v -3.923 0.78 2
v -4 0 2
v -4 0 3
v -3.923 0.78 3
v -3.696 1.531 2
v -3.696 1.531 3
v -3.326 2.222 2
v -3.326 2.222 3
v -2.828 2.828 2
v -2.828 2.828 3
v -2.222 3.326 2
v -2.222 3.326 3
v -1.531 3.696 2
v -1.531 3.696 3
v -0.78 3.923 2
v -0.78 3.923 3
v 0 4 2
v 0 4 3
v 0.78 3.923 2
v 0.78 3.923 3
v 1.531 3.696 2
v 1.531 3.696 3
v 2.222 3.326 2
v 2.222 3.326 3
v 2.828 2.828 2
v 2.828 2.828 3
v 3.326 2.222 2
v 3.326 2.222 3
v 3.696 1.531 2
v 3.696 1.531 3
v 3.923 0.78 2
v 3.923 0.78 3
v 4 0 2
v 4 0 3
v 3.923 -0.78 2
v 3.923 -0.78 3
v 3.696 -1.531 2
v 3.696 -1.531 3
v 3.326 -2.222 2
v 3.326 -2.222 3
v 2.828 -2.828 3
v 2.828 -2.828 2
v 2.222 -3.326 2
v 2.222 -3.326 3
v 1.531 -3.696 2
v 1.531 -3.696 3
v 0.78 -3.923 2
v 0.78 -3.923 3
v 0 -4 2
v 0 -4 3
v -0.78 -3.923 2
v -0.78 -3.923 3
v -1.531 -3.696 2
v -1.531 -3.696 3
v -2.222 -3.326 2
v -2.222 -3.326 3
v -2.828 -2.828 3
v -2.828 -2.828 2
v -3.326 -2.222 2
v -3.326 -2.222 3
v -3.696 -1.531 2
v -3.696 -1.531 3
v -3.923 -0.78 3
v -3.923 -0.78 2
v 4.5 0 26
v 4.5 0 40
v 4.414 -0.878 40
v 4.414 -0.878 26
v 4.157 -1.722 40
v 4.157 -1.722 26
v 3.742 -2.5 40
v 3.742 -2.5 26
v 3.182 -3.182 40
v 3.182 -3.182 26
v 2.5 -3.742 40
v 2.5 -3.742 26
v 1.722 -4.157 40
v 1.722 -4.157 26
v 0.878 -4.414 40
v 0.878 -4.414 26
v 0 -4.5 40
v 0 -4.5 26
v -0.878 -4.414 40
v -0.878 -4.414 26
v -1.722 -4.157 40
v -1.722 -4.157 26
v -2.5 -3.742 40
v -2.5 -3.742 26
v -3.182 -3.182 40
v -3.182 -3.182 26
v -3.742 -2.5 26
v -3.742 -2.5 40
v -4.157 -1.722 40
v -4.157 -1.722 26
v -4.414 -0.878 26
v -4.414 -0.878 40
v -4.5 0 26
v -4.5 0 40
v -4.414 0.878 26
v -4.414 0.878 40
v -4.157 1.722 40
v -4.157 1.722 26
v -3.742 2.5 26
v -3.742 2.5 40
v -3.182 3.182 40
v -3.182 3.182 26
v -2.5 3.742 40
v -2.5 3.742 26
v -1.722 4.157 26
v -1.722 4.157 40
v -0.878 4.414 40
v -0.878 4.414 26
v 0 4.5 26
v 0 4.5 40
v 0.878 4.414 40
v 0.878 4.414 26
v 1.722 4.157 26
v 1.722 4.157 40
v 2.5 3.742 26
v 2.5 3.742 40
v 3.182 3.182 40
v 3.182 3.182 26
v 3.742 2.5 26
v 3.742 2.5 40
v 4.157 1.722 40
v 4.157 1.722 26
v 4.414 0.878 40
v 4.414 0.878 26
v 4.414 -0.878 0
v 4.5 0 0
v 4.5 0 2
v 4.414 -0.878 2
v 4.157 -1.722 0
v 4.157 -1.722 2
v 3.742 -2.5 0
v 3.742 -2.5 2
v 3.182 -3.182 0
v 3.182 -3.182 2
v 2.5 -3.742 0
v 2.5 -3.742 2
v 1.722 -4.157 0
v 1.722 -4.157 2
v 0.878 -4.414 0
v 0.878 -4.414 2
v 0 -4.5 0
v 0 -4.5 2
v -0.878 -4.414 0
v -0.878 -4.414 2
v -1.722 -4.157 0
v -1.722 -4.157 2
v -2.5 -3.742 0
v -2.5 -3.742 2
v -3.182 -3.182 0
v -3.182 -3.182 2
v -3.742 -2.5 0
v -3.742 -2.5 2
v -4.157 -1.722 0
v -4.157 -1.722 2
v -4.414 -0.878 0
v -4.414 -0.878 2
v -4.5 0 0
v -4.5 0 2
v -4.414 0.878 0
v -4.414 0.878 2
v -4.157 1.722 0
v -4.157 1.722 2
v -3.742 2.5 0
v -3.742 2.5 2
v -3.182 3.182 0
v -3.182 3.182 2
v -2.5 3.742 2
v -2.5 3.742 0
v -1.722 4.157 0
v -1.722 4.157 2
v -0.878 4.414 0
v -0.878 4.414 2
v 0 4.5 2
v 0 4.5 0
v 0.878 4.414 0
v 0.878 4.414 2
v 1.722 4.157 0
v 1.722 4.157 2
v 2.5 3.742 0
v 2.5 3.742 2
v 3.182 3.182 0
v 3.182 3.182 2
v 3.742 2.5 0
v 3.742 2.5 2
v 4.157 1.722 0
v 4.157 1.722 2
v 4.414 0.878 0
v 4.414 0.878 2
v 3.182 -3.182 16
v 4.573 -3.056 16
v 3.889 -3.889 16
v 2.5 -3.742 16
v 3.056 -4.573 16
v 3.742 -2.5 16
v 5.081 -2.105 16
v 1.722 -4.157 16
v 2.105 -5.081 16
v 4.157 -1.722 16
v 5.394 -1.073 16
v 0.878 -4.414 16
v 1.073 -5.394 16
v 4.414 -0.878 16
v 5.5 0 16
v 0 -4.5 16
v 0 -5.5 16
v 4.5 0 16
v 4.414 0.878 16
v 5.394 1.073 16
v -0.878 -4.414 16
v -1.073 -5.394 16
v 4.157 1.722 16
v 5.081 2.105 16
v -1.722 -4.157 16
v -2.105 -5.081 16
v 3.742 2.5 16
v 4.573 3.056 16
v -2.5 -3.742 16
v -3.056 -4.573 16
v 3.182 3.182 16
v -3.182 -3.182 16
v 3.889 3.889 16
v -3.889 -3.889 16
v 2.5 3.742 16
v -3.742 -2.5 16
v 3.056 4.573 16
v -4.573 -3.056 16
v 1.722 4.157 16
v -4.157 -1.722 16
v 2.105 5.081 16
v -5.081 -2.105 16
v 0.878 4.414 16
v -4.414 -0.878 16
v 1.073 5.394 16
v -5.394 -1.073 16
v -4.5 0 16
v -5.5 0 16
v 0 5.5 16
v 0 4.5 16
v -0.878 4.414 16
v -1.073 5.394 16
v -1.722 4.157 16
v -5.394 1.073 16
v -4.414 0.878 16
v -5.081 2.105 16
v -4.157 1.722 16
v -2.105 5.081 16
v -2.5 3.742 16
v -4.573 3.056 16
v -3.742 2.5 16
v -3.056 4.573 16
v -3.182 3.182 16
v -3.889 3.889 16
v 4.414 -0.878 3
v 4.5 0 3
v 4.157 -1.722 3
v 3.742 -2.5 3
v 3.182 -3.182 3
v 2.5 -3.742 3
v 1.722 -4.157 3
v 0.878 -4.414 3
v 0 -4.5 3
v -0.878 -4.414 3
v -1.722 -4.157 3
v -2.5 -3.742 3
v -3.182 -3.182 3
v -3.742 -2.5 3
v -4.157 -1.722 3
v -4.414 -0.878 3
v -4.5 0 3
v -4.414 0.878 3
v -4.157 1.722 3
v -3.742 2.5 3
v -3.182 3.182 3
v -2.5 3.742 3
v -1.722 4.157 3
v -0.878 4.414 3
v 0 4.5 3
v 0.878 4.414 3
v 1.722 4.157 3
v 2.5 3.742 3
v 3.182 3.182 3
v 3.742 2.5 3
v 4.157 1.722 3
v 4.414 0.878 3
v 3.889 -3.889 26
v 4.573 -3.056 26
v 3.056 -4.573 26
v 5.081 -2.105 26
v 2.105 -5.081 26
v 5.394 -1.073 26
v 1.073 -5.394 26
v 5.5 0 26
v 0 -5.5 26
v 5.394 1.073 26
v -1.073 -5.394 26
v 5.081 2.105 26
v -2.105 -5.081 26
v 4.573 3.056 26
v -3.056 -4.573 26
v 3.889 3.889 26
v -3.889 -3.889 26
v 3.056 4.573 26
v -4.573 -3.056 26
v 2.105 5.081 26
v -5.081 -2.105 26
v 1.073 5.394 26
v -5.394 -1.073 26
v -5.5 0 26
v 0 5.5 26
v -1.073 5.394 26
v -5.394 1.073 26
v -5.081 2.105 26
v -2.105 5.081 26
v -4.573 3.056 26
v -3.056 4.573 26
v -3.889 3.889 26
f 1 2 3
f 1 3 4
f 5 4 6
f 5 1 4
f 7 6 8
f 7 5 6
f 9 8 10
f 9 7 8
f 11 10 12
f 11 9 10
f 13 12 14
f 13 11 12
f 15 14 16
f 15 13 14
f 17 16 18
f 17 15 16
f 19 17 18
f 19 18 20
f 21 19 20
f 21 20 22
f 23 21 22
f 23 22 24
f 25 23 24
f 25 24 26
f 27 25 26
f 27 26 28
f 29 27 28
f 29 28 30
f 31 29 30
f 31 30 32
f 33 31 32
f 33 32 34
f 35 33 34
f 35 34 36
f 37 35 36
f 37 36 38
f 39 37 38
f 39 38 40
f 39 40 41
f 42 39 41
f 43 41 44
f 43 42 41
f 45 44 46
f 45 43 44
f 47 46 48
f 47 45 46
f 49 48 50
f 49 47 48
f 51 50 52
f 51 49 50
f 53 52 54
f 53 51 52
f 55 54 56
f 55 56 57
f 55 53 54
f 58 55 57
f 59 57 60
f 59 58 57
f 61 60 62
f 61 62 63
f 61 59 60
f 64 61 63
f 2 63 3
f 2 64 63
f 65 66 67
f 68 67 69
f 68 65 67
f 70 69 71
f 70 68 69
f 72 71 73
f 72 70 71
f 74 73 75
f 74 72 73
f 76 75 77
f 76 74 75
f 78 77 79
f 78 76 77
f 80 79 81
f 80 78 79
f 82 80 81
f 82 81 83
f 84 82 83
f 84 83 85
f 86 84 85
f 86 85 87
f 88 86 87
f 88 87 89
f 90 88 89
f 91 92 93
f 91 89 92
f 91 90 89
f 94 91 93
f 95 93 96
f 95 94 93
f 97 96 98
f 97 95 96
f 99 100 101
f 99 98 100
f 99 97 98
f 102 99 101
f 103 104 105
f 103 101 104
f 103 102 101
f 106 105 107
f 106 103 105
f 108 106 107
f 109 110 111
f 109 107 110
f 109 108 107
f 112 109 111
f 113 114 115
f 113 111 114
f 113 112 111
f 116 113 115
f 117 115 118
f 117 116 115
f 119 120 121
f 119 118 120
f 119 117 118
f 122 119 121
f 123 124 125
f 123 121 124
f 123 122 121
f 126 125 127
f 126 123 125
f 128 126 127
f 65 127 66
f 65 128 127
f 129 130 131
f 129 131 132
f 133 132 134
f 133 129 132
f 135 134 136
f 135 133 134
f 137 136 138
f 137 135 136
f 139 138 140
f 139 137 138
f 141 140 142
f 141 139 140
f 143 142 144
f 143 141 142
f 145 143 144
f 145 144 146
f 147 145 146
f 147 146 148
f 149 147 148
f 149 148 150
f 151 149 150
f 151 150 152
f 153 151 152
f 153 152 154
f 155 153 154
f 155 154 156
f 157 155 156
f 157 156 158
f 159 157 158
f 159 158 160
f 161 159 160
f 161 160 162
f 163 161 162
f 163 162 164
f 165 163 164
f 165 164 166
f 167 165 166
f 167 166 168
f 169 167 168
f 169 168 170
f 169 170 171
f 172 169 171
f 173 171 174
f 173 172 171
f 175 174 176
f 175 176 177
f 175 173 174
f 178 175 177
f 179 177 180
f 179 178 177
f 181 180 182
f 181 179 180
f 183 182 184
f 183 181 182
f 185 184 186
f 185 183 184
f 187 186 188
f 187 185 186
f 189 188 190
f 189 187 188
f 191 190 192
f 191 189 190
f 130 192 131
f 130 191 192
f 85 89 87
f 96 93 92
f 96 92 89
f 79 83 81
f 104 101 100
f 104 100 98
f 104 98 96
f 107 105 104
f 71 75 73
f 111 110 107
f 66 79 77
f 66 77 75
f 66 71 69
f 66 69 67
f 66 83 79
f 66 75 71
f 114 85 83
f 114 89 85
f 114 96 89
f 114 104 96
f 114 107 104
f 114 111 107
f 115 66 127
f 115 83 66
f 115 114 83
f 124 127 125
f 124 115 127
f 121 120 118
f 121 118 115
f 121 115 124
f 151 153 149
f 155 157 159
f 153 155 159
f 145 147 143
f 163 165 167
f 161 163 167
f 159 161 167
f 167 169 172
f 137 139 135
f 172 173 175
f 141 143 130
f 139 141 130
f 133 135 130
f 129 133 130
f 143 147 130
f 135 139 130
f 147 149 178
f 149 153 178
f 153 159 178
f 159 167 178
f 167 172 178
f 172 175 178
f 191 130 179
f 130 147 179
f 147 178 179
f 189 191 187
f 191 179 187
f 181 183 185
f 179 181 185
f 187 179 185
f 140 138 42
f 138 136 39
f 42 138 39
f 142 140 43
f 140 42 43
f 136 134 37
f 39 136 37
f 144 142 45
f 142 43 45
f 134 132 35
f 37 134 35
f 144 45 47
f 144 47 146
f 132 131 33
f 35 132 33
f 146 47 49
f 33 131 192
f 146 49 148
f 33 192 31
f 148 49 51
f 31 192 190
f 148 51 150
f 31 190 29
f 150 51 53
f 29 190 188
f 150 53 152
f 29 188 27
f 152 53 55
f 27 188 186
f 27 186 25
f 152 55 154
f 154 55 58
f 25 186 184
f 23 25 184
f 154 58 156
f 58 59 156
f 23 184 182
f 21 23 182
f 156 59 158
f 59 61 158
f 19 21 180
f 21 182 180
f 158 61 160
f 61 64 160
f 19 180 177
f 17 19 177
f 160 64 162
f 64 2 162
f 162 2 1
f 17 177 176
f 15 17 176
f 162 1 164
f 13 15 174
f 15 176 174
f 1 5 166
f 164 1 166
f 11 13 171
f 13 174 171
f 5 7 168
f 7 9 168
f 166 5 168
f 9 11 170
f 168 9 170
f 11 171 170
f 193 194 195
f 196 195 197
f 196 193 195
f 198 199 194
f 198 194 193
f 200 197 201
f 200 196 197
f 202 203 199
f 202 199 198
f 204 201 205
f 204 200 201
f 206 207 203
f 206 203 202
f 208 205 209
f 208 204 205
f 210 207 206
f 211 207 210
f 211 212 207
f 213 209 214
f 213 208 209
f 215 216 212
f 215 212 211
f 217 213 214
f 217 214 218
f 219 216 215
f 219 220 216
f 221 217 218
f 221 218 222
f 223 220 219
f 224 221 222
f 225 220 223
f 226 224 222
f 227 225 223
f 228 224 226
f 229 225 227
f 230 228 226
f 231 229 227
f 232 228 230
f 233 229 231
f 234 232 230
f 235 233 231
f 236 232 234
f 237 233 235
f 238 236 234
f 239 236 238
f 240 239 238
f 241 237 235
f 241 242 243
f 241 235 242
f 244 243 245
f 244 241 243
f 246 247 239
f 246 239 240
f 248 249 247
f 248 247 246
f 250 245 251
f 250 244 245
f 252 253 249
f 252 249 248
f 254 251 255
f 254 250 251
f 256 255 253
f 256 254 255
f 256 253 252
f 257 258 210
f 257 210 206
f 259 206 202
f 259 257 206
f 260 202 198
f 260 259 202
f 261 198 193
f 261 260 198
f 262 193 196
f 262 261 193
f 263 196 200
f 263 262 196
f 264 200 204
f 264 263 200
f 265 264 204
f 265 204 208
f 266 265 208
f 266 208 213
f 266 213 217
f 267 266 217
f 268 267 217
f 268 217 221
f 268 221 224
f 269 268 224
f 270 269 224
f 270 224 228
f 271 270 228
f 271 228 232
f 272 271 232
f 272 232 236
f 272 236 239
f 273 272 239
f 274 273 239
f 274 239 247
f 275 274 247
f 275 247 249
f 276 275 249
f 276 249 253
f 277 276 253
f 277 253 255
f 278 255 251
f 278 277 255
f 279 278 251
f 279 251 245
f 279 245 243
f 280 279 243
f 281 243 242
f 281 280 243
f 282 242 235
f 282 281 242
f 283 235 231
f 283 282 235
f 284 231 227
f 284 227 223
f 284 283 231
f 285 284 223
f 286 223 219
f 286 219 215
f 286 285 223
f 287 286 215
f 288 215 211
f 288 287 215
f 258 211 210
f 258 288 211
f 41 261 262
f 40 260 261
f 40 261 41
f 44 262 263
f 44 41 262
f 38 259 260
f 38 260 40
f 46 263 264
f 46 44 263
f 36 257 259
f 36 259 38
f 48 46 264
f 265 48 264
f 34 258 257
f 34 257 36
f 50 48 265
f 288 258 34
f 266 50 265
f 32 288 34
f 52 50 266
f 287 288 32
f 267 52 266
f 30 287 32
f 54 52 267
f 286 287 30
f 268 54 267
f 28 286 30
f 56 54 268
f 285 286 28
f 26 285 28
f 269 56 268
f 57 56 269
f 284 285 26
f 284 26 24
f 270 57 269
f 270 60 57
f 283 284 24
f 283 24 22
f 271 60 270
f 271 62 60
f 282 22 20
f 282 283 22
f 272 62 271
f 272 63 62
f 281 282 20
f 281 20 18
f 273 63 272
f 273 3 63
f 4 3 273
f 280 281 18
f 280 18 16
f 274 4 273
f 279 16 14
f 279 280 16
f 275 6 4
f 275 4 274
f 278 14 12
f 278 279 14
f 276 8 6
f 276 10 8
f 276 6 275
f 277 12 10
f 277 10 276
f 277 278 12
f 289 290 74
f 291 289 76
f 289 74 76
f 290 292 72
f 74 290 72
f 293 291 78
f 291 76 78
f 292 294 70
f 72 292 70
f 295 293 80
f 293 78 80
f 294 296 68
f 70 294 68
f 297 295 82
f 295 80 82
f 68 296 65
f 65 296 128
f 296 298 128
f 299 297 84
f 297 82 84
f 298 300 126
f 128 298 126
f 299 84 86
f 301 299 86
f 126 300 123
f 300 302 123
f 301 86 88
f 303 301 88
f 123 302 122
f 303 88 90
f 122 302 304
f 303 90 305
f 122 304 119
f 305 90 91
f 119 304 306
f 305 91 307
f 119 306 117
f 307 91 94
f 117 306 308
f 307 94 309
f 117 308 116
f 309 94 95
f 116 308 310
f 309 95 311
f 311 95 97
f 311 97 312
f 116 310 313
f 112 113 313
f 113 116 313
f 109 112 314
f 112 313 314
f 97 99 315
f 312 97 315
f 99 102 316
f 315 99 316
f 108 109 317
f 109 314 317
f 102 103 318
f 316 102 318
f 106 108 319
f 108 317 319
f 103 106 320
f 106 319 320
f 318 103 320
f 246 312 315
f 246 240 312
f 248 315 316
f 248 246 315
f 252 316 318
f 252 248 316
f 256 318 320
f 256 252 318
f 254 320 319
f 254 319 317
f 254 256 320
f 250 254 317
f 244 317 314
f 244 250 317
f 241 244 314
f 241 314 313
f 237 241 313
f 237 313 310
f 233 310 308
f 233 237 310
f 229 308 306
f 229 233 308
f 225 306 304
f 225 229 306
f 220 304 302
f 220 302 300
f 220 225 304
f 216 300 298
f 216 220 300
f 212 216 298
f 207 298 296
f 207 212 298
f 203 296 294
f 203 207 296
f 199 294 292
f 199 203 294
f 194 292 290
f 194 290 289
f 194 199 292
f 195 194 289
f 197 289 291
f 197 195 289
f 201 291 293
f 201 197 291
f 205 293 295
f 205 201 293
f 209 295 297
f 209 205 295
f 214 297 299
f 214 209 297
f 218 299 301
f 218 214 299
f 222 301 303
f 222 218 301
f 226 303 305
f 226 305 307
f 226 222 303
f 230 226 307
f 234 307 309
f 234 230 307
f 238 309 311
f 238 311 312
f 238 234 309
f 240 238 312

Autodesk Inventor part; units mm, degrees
ref_plane "YZ Plane" through (0, 0, 0) normal (1, 0, 0) x (0, 1, 0)
sketch "草圖2" plane through (0, 0, 0) normal (0, 0, 1) x (1, 0, 0)
  circle A0 centre (0, 0) radius 4.5
  dimension "d3" = 9
extrude "擠出2" add sketch "草圖2" along normal blind 40
ref_plane "工作平面3" through (0, 0, 16) normal (0, 0, -1) x (-1, 0, 0)
sketch "草圖5" plane through (0, 0, 16) normal (0, 0, -1) x (-1, 0, 0)
  circle A0 centre (0, 0) radius 5.5
  dimension "d15" = 11
extrude "擠出5" add sketch "草圖5" against normal blind 10
ref_plane "工作平面4" through (0, 0, 2) normal (0, 0, -1) x (-1, 0, 0)
sketch "草圖6" plane through (0, 0, 2) normal (0, 0, -1) x (-1, 0, 0)
  circle A0 centre (0, 0) radius 4
  circle A1 centre (0, 0) radius 4.5 projected
  dimension "d19" = 8
extrude "擠出6" cut sketch "草圖6" against normal blind 1
properties part number "Stage1_carrier_shaft"
